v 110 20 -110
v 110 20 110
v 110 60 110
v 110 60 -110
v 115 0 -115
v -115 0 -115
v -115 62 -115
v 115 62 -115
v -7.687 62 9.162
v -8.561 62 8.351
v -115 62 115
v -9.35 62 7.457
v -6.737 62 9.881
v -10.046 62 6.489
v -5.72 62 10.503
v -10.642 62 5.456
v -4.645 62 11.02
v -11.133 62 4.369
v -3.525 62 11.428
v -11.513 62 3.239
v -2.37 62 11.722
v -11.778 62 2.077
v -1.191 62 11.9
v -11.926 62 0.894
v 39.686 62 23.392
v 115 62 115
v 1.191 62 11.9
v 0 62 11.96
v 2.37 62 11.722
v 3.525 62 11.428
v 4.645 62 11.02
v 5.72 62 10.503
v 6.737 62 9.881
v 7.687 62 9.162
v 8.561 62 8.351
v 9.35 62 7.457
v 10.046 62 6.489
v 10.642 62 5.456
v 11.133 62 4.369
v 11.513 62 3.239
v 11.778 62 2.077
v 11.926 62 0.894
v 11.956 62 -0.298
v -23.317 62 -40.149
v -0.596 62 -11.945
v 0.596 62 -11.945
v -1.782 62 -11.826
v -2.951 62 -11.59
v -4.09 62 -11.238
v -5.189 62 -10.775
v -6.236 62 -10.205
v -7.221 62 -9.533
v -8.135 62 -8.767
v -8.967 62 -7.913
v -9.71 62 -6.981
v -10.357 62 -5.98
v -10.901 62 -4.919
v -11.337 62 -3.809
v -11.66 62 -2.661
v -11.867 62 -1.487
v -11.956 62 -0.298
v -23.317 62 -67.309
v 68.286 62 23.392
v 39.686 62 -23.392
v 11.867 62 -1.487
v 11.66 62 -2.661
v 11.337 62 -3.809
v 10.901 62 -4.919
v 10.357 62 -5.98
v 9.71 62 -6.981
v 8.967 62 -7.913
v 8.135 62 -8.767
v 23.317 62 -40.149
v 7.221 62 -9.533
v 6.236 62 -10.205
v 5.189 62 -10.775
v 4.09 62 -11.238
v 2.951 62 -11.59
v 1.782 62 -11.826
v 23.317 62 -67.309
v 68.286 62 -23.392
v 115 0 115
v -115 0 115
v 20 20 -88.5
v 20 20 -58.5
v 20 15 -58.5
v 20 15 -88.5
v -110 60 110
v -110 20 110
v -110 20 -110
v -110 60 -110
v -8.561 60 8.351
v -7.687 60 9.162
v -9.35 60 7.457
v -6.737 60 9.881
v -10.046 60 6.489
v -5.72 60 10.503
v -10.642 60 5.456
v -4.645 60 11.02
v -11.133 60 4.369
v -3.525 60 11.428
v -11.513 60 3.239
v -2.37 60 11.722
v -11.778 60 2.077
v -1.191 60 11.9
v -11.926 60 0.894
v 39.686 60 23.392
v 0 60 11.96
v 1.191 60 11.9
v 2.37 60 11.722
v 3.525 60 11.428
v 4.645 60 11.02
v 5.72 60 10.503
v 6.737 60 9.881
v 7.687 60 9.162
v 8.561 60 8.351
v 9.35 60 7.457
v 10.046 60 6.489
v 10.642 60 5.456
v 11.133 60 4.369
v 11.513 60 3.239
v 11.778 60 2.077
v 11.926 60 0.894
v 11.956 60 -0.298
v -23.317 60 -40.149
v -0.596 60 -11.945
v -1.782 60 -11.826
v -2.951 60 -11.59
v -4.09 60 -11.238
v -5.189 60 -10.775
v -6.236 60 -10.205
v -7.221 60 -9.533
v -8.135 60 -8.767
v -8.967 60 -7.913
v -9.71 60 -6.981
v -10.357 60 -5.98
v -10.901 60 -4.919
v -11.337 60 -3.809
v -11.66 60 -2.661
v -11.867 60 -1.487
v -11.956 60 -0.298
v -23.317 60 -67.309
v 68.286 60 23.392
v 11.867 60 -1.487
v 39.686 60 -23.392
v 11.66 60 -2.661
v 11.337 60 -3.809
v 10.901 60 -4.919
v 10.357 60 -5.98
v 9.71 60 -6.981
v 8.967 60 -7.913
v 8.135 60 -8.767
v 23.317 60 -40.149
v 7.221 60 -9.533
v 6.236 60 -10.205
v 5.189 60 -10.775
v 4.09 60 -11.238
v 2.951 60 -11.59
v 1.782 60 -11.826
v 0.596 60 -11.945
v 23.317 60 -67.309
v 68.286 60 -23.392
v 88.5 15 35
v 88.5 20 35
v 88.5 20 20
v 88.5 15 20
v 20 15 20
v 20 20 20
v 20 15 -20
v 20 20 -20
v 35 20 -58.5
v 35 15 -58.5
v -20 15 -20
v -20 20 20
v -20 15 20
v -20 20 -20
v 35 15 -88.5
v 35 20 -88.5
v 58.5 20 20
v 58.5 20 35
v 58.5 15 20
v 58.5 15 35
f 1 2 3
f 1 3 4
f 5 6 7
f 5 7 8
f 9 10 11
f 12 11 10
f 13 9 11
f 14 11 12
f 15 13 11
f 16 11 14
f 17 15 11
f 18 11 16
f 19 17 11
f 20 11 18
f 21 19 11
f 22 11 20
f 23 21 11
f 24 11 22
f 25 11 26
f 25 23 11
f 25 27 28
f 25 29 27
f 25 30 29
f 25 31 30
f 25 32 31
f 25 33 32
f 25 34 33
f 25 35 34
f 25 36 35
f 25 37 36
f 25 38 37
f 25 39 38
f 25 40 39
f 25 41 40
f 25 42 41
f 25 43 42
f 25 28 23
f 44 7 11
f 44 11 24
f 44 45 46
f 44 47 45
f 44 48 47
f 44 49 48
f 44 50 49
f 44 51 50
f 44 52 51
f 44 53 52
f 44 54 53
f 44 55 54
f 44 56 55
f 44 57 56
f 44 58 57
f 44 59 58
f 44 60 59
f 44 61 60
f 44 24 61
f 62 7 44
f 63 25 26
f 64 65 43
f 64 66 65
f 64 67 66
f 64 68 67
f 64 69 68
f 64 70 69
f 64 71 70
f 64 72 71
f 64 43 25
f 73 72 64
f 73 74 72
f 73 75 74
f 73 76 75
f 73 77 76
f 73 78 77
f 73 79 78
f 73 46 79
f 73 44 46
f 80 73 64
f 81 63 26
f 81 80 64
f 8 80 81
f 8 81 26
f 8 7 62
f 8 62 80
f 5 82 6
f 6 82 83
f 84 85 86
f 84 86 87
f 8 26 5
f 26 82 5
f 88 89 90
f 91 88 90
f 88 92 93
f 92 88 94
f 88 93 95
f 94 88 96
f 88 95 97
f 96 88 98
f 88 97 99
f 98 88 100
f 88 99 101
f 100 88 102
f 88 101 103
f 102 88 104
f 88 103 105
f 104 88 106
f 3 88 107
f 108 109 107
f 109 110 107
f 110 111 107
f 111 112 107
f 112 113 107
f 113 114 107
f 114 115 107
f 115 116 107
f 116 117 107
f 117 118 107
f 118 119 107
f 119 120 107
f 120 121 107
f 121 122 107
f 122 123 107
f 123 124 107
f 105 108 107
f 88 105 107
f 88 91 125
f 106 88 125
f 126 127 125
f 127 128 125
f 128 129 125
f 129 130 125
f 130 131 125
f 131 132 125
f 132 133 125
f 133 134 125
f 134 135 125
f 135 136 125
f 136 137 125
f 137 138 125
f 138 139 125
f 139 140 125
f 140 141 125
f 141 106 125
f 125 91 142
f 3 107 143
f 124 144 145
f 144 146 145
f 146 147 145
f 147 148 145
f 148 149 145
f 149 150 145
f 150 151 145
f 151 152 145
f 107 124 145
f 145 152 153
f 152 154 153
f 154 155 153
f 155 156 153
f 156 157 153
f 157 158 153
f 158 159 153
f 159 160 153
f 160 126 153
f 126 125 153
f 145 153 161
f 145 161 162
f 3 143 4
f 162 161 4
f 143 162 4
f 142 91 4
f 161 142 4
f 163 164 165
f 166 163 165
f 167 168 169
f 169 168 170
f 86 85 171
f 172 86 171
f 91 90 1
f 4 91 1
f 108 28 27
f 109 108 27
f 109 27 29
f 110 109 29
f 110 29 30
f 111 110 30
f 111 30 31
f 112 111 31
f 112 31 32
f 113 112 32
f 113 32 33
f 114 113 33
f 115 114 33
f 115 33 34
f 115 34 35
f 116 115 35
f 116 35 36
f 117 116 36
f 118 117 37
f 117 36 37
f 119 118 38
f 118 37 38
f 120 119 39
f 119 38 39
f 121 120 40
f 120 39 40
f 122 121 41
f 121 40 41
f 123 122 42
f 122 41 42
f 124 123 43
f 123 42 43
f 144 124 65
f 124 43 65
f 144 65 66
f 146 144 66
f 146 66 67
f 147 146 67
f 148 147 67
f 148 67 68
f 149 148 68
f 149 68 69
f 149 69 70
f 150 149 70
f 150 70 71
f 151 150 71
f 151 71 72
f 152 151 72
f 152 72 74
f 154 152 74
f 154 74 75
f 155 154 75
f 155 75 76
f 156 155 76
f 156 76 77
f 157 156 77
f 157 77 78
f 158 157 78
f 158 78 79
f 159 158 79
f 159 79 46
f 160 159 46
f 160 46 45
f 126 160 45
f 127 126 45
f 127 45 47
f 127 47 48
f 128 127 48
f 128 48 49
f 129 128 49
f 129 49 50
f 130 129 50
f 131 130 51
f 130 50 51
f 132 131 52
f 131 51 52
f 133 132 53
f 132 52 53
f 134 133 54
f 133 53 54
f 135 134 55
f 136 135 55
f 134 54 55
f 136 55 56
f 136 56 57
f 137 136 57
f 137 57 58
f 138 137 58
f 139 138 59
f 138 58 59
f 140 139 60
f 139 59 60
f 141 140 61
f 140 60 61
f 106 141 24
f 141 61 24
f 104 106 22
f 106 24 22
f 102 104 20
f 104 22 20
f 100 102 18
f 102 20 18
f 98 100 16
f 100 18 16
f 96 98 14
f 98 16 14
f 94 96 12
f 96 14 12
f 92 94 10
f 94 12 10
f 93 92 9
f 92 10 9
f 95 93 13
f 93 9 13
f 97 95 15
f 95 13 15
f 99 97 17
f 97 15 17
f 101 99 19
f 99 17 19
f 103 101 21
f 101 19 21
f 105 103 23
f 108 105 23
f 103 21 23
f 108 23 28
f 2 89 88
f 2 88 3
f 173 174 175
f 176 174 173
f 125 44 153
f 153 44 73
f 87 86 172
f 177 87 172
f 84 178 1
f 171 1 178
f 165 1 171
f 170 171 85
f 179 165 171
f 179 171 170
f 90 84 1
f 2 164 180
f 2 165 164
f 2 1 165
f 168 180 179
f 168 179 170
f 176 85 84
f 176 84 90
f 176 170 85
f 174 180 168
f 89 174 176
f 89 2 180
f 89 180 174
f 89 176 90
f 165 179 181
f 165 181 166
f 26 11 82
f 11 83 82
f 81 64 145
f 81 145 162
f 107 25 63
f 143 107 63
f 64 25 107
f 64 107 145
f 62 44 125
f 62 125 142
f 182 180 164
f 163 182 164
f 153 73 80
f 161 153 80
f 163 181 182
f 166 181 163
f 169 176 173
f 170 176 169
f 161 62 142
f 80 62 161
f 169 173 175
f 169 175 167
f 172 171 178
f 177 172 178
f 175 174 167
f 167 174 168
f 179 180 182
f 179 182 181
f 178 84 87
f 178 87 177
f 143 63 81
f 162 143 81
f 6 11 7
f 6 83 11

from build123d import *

# Parameters (mm, degrees)
CROQUIS1_W              = 250
CROQUIS1_H              = 250
SALIENTE_EXTRUIR1_DEPTH = 20
CROQUIS2_W              = 15
CROQUIS2_H              = 30
CROQUIS2_W_2            = 30
CROQUIS2_H_2            = 15
CROQUIS2_W_3            = 40
CROQUIS2_H_3            = 40
CORTAR_EXTRUIR1_DEPTH   = 5
CROQUIS3_W              = 250
CROQUIS3_H              = 250
CROQUIS3_W_2            = 200
CROQUIS3_H_2            = 200
CORTAR_EXTRUIR2_DEPTH   = 20
CROQUIS4_W              = 200
CROQUIS4_H              = 200
SALIENTE_EXTRUIR2_DEPTH = 20
CROQUIS5_W              = 220
CROQUIS5_H              = 220
SALIENTE_EXTRUIR3_DEPTH = 40
CROQUIS6_W              = 230
CROQUIS6_H              = 230
SALIENTE_EXTRUIR4_DEPTH = 2
CORTAR_EXTRUIR5_REACH   = 176.052
CROQUIS8_R              = 9.175009618
CROQUIS8_W              = 28.599511609
CROQUIS8_H              = 46.78347923
CROQUIS8_W_2            = 46.633839802
CROQUIS8_H_2            = 27.159350596
CORTAR_EXTRUIR4_REACH   = 176.052
CROQUIS10_R             = 11.959510452


with BuildPart() as part:
    # Croquis1 → Saliente-Extruir1 (new body)
    with BuildSketch(Plane(origin=(0, 0, 0), x_dir=(1, 0, 0), z_dir=(0, 1, 0))):
        Rectangle(CROQUIS1_W, CROQUIS1_H)
    extrude(amount=SALIENTE_EXTRUIR1_DEPTH)

    # Croquis2 → Cortar-Extruir1 (cut)
    with BuildSketch(Plane(origin=(0, 20, 0), x_dir=(1, 0, 0), z_dir=(0, 1, 0))):
        with Locations((27.5, 73.5)):
            Rectangle(CROQUIS2_W, CROQUIS2_H)
        with Locations((73.5, -27.5)):
            Rectangle(CROQUIS2_W_2, CROQUIS2_H_2)
        Rectangle(CROQUIS2_W_3, CROQUIS2_H_3)
    extrude(amount=-CORTAR_EXTRUIR1_DEPTH, mode=Mode.SUBTRACT)

    # Croquis3 → Cortar-Extruir2 (cut)
    with BuildSketch(Plane(origin=(0, 20, 0), x_dir=(1, 0, 0), z_dir=(0, 1, 0))):
        Rectangle(CROQUIS3_W, CROQUIS3_H)
        Rectangle(CROQUIS3_W_2, CROQUIS3_H_2, mode=Mode.SUBTRACT)
    extrude(amount=-CORTAR_EXTRUIR2_DEPTH, mode=Mode.SUBTRACT)

    # Croquis4 → Saliente-Extruir2 (add)
    with BuildSketch(Plane.XZ):
        Polygon((115, -96.500184321), (115, -115), (-115, -115), (-115, -98.664064905), (-115, 115), (-100, 115), (115, 115), (115, 96.335935095), align=None)
        Rectangle(CROQUIS4_W, CROQUIS4_H, mode=Mode.SUBTRACT)
    extrude(amount=-SALIENTE_EXTRUIR2_DEPTH)

    # Croquis5 → Saliente-Extruir3 (add)
    with BuildSketch(Plane(origin=(0, 20, 0), x_dir=(1, 0, 0), z_dir=(0, 1, 0))):
        Polygon((115, 115), (-115, 115), (-115, 110.241153541), (-115, -107.327290452), (-115, -115), (-108.298578148, -115), (115, -115), (115, -107.327290452), (115, 110.241153541), align=None)
        Rectangle(CROQUIS5_W, CROQUIS5_H, mode=Mode.SUBTRACT)
    extrude(amount=SALIENTE_EXTRUIR3_DEPTH)

    # Croquis6 → Saliente-Extruir4 (add)
    with BuildSketch(Plane(origin=(0, 60, 0), x_dir=(1, 0, 0), z_dir=(0, 1, 0))):
        Rectangle(CROQUIS6_W, CROQUIS6_H)
    extrude(amount=SALIENTE_EXTRUIR4_DEPTH)

    # Croquis8 → Cortar-Extruir5 (cut, up to next)
    with BuildSketch(Plane(origin=(0, 62, 0), x_dir=(1, 0, 0), z_dir=(0, 1, 0)), mode=Mode.PRIVATE) as cortar_extruir5_sk1:
        with Locations(Location((0, 0, 0), (0, 0, 270))):
            Circle(CROQUIS8_R)
    cortar_extruir5_tool1 = extrude(cortar_extruir5_sk1.sketch, amount=-CORTAR_EXTRUIR5_REACH, mode=Mode.PRIVATE) & part.part
    # Croquis8 → Cortar-Extruir5 (cut, up to next)
    with BuildSketch(Plane(origin=(0, 62, 0), x_dir=(1, 0, 0), z_dir=(0, 1, 0)), mode=Mode.PRIVATE) as cortar_extruir5_sk2:
        with Locations((53.986056935, 0)):
            Rectangle(CROQUIS8_W, CROQUIS8_H)
    cortar_extruir5_tool2 = extrude(cortar_extruir5_sk2.sketch, amount=-CORTAR_EXTRUIR5_REACH, mode=Mode.PRIVATE) & part.part
    # Croquis8 → Cortar-Extruir5 (cut, up to next)
    with BuildSketch(Plane(origin=(0, 62, 0), x_dir=(1, 0, 0), z_dir=(0, 1, 0)), mode=Mode.PRIVATE) as cortar_extruir5_sk3:
        with Locations((0, 53.729056372)):
            Rectangle(CROQUIS8_W_2, CROQUIS8_H_2)
    cortar_extruir5_tool3 = extrude(cortar_extruir5_sk3.sketch, amount=-CORTAR_EXTRUIR5_REACH, mode=Mode.PRIVATE) & part.part
    add(cortar_extruir5_tool1.solids().sort_by_distance((0, 62, 0))[0], mode=Mode.SUBTRACT)
    add(cortar_extruir5_tool2.solids().sort_by_distance((53.986057, 62, 0))[0], mode=Mode.SUBTRACT)
    add(cortar_extruir5_tool3.solids().sort_by_distance((0, 62, -53.729056))[0], mode=Mode.SUBTRACT)

    # Croquis10 → Cortar-Extruir4 (cut, up to next)
    with BuildSketch(Plane(origin=(0, 62, 0), x_dir=(1, 0, 0), z_dir=(0, 1, 0)), mode=Mode.PRIVATE) as cortar_extruir4_sk1:
        with Locations(Location((0, 0, 0), (0, 0, 270))):
            Circle(CROQUIS10_R)
    cortar_extruir4_tool1 = extrude(cortar_extruir4_sk1.sketch, amount=-CORTAR_EXTRUIR4_REACH, mode=Mode.PRIVATE) & part.part
    add(cortar_extruir4_tool1.solids().sort_by_distance((0, 62, 0))[0], mode=Mode.SUBTRACT)


solid = part.part
